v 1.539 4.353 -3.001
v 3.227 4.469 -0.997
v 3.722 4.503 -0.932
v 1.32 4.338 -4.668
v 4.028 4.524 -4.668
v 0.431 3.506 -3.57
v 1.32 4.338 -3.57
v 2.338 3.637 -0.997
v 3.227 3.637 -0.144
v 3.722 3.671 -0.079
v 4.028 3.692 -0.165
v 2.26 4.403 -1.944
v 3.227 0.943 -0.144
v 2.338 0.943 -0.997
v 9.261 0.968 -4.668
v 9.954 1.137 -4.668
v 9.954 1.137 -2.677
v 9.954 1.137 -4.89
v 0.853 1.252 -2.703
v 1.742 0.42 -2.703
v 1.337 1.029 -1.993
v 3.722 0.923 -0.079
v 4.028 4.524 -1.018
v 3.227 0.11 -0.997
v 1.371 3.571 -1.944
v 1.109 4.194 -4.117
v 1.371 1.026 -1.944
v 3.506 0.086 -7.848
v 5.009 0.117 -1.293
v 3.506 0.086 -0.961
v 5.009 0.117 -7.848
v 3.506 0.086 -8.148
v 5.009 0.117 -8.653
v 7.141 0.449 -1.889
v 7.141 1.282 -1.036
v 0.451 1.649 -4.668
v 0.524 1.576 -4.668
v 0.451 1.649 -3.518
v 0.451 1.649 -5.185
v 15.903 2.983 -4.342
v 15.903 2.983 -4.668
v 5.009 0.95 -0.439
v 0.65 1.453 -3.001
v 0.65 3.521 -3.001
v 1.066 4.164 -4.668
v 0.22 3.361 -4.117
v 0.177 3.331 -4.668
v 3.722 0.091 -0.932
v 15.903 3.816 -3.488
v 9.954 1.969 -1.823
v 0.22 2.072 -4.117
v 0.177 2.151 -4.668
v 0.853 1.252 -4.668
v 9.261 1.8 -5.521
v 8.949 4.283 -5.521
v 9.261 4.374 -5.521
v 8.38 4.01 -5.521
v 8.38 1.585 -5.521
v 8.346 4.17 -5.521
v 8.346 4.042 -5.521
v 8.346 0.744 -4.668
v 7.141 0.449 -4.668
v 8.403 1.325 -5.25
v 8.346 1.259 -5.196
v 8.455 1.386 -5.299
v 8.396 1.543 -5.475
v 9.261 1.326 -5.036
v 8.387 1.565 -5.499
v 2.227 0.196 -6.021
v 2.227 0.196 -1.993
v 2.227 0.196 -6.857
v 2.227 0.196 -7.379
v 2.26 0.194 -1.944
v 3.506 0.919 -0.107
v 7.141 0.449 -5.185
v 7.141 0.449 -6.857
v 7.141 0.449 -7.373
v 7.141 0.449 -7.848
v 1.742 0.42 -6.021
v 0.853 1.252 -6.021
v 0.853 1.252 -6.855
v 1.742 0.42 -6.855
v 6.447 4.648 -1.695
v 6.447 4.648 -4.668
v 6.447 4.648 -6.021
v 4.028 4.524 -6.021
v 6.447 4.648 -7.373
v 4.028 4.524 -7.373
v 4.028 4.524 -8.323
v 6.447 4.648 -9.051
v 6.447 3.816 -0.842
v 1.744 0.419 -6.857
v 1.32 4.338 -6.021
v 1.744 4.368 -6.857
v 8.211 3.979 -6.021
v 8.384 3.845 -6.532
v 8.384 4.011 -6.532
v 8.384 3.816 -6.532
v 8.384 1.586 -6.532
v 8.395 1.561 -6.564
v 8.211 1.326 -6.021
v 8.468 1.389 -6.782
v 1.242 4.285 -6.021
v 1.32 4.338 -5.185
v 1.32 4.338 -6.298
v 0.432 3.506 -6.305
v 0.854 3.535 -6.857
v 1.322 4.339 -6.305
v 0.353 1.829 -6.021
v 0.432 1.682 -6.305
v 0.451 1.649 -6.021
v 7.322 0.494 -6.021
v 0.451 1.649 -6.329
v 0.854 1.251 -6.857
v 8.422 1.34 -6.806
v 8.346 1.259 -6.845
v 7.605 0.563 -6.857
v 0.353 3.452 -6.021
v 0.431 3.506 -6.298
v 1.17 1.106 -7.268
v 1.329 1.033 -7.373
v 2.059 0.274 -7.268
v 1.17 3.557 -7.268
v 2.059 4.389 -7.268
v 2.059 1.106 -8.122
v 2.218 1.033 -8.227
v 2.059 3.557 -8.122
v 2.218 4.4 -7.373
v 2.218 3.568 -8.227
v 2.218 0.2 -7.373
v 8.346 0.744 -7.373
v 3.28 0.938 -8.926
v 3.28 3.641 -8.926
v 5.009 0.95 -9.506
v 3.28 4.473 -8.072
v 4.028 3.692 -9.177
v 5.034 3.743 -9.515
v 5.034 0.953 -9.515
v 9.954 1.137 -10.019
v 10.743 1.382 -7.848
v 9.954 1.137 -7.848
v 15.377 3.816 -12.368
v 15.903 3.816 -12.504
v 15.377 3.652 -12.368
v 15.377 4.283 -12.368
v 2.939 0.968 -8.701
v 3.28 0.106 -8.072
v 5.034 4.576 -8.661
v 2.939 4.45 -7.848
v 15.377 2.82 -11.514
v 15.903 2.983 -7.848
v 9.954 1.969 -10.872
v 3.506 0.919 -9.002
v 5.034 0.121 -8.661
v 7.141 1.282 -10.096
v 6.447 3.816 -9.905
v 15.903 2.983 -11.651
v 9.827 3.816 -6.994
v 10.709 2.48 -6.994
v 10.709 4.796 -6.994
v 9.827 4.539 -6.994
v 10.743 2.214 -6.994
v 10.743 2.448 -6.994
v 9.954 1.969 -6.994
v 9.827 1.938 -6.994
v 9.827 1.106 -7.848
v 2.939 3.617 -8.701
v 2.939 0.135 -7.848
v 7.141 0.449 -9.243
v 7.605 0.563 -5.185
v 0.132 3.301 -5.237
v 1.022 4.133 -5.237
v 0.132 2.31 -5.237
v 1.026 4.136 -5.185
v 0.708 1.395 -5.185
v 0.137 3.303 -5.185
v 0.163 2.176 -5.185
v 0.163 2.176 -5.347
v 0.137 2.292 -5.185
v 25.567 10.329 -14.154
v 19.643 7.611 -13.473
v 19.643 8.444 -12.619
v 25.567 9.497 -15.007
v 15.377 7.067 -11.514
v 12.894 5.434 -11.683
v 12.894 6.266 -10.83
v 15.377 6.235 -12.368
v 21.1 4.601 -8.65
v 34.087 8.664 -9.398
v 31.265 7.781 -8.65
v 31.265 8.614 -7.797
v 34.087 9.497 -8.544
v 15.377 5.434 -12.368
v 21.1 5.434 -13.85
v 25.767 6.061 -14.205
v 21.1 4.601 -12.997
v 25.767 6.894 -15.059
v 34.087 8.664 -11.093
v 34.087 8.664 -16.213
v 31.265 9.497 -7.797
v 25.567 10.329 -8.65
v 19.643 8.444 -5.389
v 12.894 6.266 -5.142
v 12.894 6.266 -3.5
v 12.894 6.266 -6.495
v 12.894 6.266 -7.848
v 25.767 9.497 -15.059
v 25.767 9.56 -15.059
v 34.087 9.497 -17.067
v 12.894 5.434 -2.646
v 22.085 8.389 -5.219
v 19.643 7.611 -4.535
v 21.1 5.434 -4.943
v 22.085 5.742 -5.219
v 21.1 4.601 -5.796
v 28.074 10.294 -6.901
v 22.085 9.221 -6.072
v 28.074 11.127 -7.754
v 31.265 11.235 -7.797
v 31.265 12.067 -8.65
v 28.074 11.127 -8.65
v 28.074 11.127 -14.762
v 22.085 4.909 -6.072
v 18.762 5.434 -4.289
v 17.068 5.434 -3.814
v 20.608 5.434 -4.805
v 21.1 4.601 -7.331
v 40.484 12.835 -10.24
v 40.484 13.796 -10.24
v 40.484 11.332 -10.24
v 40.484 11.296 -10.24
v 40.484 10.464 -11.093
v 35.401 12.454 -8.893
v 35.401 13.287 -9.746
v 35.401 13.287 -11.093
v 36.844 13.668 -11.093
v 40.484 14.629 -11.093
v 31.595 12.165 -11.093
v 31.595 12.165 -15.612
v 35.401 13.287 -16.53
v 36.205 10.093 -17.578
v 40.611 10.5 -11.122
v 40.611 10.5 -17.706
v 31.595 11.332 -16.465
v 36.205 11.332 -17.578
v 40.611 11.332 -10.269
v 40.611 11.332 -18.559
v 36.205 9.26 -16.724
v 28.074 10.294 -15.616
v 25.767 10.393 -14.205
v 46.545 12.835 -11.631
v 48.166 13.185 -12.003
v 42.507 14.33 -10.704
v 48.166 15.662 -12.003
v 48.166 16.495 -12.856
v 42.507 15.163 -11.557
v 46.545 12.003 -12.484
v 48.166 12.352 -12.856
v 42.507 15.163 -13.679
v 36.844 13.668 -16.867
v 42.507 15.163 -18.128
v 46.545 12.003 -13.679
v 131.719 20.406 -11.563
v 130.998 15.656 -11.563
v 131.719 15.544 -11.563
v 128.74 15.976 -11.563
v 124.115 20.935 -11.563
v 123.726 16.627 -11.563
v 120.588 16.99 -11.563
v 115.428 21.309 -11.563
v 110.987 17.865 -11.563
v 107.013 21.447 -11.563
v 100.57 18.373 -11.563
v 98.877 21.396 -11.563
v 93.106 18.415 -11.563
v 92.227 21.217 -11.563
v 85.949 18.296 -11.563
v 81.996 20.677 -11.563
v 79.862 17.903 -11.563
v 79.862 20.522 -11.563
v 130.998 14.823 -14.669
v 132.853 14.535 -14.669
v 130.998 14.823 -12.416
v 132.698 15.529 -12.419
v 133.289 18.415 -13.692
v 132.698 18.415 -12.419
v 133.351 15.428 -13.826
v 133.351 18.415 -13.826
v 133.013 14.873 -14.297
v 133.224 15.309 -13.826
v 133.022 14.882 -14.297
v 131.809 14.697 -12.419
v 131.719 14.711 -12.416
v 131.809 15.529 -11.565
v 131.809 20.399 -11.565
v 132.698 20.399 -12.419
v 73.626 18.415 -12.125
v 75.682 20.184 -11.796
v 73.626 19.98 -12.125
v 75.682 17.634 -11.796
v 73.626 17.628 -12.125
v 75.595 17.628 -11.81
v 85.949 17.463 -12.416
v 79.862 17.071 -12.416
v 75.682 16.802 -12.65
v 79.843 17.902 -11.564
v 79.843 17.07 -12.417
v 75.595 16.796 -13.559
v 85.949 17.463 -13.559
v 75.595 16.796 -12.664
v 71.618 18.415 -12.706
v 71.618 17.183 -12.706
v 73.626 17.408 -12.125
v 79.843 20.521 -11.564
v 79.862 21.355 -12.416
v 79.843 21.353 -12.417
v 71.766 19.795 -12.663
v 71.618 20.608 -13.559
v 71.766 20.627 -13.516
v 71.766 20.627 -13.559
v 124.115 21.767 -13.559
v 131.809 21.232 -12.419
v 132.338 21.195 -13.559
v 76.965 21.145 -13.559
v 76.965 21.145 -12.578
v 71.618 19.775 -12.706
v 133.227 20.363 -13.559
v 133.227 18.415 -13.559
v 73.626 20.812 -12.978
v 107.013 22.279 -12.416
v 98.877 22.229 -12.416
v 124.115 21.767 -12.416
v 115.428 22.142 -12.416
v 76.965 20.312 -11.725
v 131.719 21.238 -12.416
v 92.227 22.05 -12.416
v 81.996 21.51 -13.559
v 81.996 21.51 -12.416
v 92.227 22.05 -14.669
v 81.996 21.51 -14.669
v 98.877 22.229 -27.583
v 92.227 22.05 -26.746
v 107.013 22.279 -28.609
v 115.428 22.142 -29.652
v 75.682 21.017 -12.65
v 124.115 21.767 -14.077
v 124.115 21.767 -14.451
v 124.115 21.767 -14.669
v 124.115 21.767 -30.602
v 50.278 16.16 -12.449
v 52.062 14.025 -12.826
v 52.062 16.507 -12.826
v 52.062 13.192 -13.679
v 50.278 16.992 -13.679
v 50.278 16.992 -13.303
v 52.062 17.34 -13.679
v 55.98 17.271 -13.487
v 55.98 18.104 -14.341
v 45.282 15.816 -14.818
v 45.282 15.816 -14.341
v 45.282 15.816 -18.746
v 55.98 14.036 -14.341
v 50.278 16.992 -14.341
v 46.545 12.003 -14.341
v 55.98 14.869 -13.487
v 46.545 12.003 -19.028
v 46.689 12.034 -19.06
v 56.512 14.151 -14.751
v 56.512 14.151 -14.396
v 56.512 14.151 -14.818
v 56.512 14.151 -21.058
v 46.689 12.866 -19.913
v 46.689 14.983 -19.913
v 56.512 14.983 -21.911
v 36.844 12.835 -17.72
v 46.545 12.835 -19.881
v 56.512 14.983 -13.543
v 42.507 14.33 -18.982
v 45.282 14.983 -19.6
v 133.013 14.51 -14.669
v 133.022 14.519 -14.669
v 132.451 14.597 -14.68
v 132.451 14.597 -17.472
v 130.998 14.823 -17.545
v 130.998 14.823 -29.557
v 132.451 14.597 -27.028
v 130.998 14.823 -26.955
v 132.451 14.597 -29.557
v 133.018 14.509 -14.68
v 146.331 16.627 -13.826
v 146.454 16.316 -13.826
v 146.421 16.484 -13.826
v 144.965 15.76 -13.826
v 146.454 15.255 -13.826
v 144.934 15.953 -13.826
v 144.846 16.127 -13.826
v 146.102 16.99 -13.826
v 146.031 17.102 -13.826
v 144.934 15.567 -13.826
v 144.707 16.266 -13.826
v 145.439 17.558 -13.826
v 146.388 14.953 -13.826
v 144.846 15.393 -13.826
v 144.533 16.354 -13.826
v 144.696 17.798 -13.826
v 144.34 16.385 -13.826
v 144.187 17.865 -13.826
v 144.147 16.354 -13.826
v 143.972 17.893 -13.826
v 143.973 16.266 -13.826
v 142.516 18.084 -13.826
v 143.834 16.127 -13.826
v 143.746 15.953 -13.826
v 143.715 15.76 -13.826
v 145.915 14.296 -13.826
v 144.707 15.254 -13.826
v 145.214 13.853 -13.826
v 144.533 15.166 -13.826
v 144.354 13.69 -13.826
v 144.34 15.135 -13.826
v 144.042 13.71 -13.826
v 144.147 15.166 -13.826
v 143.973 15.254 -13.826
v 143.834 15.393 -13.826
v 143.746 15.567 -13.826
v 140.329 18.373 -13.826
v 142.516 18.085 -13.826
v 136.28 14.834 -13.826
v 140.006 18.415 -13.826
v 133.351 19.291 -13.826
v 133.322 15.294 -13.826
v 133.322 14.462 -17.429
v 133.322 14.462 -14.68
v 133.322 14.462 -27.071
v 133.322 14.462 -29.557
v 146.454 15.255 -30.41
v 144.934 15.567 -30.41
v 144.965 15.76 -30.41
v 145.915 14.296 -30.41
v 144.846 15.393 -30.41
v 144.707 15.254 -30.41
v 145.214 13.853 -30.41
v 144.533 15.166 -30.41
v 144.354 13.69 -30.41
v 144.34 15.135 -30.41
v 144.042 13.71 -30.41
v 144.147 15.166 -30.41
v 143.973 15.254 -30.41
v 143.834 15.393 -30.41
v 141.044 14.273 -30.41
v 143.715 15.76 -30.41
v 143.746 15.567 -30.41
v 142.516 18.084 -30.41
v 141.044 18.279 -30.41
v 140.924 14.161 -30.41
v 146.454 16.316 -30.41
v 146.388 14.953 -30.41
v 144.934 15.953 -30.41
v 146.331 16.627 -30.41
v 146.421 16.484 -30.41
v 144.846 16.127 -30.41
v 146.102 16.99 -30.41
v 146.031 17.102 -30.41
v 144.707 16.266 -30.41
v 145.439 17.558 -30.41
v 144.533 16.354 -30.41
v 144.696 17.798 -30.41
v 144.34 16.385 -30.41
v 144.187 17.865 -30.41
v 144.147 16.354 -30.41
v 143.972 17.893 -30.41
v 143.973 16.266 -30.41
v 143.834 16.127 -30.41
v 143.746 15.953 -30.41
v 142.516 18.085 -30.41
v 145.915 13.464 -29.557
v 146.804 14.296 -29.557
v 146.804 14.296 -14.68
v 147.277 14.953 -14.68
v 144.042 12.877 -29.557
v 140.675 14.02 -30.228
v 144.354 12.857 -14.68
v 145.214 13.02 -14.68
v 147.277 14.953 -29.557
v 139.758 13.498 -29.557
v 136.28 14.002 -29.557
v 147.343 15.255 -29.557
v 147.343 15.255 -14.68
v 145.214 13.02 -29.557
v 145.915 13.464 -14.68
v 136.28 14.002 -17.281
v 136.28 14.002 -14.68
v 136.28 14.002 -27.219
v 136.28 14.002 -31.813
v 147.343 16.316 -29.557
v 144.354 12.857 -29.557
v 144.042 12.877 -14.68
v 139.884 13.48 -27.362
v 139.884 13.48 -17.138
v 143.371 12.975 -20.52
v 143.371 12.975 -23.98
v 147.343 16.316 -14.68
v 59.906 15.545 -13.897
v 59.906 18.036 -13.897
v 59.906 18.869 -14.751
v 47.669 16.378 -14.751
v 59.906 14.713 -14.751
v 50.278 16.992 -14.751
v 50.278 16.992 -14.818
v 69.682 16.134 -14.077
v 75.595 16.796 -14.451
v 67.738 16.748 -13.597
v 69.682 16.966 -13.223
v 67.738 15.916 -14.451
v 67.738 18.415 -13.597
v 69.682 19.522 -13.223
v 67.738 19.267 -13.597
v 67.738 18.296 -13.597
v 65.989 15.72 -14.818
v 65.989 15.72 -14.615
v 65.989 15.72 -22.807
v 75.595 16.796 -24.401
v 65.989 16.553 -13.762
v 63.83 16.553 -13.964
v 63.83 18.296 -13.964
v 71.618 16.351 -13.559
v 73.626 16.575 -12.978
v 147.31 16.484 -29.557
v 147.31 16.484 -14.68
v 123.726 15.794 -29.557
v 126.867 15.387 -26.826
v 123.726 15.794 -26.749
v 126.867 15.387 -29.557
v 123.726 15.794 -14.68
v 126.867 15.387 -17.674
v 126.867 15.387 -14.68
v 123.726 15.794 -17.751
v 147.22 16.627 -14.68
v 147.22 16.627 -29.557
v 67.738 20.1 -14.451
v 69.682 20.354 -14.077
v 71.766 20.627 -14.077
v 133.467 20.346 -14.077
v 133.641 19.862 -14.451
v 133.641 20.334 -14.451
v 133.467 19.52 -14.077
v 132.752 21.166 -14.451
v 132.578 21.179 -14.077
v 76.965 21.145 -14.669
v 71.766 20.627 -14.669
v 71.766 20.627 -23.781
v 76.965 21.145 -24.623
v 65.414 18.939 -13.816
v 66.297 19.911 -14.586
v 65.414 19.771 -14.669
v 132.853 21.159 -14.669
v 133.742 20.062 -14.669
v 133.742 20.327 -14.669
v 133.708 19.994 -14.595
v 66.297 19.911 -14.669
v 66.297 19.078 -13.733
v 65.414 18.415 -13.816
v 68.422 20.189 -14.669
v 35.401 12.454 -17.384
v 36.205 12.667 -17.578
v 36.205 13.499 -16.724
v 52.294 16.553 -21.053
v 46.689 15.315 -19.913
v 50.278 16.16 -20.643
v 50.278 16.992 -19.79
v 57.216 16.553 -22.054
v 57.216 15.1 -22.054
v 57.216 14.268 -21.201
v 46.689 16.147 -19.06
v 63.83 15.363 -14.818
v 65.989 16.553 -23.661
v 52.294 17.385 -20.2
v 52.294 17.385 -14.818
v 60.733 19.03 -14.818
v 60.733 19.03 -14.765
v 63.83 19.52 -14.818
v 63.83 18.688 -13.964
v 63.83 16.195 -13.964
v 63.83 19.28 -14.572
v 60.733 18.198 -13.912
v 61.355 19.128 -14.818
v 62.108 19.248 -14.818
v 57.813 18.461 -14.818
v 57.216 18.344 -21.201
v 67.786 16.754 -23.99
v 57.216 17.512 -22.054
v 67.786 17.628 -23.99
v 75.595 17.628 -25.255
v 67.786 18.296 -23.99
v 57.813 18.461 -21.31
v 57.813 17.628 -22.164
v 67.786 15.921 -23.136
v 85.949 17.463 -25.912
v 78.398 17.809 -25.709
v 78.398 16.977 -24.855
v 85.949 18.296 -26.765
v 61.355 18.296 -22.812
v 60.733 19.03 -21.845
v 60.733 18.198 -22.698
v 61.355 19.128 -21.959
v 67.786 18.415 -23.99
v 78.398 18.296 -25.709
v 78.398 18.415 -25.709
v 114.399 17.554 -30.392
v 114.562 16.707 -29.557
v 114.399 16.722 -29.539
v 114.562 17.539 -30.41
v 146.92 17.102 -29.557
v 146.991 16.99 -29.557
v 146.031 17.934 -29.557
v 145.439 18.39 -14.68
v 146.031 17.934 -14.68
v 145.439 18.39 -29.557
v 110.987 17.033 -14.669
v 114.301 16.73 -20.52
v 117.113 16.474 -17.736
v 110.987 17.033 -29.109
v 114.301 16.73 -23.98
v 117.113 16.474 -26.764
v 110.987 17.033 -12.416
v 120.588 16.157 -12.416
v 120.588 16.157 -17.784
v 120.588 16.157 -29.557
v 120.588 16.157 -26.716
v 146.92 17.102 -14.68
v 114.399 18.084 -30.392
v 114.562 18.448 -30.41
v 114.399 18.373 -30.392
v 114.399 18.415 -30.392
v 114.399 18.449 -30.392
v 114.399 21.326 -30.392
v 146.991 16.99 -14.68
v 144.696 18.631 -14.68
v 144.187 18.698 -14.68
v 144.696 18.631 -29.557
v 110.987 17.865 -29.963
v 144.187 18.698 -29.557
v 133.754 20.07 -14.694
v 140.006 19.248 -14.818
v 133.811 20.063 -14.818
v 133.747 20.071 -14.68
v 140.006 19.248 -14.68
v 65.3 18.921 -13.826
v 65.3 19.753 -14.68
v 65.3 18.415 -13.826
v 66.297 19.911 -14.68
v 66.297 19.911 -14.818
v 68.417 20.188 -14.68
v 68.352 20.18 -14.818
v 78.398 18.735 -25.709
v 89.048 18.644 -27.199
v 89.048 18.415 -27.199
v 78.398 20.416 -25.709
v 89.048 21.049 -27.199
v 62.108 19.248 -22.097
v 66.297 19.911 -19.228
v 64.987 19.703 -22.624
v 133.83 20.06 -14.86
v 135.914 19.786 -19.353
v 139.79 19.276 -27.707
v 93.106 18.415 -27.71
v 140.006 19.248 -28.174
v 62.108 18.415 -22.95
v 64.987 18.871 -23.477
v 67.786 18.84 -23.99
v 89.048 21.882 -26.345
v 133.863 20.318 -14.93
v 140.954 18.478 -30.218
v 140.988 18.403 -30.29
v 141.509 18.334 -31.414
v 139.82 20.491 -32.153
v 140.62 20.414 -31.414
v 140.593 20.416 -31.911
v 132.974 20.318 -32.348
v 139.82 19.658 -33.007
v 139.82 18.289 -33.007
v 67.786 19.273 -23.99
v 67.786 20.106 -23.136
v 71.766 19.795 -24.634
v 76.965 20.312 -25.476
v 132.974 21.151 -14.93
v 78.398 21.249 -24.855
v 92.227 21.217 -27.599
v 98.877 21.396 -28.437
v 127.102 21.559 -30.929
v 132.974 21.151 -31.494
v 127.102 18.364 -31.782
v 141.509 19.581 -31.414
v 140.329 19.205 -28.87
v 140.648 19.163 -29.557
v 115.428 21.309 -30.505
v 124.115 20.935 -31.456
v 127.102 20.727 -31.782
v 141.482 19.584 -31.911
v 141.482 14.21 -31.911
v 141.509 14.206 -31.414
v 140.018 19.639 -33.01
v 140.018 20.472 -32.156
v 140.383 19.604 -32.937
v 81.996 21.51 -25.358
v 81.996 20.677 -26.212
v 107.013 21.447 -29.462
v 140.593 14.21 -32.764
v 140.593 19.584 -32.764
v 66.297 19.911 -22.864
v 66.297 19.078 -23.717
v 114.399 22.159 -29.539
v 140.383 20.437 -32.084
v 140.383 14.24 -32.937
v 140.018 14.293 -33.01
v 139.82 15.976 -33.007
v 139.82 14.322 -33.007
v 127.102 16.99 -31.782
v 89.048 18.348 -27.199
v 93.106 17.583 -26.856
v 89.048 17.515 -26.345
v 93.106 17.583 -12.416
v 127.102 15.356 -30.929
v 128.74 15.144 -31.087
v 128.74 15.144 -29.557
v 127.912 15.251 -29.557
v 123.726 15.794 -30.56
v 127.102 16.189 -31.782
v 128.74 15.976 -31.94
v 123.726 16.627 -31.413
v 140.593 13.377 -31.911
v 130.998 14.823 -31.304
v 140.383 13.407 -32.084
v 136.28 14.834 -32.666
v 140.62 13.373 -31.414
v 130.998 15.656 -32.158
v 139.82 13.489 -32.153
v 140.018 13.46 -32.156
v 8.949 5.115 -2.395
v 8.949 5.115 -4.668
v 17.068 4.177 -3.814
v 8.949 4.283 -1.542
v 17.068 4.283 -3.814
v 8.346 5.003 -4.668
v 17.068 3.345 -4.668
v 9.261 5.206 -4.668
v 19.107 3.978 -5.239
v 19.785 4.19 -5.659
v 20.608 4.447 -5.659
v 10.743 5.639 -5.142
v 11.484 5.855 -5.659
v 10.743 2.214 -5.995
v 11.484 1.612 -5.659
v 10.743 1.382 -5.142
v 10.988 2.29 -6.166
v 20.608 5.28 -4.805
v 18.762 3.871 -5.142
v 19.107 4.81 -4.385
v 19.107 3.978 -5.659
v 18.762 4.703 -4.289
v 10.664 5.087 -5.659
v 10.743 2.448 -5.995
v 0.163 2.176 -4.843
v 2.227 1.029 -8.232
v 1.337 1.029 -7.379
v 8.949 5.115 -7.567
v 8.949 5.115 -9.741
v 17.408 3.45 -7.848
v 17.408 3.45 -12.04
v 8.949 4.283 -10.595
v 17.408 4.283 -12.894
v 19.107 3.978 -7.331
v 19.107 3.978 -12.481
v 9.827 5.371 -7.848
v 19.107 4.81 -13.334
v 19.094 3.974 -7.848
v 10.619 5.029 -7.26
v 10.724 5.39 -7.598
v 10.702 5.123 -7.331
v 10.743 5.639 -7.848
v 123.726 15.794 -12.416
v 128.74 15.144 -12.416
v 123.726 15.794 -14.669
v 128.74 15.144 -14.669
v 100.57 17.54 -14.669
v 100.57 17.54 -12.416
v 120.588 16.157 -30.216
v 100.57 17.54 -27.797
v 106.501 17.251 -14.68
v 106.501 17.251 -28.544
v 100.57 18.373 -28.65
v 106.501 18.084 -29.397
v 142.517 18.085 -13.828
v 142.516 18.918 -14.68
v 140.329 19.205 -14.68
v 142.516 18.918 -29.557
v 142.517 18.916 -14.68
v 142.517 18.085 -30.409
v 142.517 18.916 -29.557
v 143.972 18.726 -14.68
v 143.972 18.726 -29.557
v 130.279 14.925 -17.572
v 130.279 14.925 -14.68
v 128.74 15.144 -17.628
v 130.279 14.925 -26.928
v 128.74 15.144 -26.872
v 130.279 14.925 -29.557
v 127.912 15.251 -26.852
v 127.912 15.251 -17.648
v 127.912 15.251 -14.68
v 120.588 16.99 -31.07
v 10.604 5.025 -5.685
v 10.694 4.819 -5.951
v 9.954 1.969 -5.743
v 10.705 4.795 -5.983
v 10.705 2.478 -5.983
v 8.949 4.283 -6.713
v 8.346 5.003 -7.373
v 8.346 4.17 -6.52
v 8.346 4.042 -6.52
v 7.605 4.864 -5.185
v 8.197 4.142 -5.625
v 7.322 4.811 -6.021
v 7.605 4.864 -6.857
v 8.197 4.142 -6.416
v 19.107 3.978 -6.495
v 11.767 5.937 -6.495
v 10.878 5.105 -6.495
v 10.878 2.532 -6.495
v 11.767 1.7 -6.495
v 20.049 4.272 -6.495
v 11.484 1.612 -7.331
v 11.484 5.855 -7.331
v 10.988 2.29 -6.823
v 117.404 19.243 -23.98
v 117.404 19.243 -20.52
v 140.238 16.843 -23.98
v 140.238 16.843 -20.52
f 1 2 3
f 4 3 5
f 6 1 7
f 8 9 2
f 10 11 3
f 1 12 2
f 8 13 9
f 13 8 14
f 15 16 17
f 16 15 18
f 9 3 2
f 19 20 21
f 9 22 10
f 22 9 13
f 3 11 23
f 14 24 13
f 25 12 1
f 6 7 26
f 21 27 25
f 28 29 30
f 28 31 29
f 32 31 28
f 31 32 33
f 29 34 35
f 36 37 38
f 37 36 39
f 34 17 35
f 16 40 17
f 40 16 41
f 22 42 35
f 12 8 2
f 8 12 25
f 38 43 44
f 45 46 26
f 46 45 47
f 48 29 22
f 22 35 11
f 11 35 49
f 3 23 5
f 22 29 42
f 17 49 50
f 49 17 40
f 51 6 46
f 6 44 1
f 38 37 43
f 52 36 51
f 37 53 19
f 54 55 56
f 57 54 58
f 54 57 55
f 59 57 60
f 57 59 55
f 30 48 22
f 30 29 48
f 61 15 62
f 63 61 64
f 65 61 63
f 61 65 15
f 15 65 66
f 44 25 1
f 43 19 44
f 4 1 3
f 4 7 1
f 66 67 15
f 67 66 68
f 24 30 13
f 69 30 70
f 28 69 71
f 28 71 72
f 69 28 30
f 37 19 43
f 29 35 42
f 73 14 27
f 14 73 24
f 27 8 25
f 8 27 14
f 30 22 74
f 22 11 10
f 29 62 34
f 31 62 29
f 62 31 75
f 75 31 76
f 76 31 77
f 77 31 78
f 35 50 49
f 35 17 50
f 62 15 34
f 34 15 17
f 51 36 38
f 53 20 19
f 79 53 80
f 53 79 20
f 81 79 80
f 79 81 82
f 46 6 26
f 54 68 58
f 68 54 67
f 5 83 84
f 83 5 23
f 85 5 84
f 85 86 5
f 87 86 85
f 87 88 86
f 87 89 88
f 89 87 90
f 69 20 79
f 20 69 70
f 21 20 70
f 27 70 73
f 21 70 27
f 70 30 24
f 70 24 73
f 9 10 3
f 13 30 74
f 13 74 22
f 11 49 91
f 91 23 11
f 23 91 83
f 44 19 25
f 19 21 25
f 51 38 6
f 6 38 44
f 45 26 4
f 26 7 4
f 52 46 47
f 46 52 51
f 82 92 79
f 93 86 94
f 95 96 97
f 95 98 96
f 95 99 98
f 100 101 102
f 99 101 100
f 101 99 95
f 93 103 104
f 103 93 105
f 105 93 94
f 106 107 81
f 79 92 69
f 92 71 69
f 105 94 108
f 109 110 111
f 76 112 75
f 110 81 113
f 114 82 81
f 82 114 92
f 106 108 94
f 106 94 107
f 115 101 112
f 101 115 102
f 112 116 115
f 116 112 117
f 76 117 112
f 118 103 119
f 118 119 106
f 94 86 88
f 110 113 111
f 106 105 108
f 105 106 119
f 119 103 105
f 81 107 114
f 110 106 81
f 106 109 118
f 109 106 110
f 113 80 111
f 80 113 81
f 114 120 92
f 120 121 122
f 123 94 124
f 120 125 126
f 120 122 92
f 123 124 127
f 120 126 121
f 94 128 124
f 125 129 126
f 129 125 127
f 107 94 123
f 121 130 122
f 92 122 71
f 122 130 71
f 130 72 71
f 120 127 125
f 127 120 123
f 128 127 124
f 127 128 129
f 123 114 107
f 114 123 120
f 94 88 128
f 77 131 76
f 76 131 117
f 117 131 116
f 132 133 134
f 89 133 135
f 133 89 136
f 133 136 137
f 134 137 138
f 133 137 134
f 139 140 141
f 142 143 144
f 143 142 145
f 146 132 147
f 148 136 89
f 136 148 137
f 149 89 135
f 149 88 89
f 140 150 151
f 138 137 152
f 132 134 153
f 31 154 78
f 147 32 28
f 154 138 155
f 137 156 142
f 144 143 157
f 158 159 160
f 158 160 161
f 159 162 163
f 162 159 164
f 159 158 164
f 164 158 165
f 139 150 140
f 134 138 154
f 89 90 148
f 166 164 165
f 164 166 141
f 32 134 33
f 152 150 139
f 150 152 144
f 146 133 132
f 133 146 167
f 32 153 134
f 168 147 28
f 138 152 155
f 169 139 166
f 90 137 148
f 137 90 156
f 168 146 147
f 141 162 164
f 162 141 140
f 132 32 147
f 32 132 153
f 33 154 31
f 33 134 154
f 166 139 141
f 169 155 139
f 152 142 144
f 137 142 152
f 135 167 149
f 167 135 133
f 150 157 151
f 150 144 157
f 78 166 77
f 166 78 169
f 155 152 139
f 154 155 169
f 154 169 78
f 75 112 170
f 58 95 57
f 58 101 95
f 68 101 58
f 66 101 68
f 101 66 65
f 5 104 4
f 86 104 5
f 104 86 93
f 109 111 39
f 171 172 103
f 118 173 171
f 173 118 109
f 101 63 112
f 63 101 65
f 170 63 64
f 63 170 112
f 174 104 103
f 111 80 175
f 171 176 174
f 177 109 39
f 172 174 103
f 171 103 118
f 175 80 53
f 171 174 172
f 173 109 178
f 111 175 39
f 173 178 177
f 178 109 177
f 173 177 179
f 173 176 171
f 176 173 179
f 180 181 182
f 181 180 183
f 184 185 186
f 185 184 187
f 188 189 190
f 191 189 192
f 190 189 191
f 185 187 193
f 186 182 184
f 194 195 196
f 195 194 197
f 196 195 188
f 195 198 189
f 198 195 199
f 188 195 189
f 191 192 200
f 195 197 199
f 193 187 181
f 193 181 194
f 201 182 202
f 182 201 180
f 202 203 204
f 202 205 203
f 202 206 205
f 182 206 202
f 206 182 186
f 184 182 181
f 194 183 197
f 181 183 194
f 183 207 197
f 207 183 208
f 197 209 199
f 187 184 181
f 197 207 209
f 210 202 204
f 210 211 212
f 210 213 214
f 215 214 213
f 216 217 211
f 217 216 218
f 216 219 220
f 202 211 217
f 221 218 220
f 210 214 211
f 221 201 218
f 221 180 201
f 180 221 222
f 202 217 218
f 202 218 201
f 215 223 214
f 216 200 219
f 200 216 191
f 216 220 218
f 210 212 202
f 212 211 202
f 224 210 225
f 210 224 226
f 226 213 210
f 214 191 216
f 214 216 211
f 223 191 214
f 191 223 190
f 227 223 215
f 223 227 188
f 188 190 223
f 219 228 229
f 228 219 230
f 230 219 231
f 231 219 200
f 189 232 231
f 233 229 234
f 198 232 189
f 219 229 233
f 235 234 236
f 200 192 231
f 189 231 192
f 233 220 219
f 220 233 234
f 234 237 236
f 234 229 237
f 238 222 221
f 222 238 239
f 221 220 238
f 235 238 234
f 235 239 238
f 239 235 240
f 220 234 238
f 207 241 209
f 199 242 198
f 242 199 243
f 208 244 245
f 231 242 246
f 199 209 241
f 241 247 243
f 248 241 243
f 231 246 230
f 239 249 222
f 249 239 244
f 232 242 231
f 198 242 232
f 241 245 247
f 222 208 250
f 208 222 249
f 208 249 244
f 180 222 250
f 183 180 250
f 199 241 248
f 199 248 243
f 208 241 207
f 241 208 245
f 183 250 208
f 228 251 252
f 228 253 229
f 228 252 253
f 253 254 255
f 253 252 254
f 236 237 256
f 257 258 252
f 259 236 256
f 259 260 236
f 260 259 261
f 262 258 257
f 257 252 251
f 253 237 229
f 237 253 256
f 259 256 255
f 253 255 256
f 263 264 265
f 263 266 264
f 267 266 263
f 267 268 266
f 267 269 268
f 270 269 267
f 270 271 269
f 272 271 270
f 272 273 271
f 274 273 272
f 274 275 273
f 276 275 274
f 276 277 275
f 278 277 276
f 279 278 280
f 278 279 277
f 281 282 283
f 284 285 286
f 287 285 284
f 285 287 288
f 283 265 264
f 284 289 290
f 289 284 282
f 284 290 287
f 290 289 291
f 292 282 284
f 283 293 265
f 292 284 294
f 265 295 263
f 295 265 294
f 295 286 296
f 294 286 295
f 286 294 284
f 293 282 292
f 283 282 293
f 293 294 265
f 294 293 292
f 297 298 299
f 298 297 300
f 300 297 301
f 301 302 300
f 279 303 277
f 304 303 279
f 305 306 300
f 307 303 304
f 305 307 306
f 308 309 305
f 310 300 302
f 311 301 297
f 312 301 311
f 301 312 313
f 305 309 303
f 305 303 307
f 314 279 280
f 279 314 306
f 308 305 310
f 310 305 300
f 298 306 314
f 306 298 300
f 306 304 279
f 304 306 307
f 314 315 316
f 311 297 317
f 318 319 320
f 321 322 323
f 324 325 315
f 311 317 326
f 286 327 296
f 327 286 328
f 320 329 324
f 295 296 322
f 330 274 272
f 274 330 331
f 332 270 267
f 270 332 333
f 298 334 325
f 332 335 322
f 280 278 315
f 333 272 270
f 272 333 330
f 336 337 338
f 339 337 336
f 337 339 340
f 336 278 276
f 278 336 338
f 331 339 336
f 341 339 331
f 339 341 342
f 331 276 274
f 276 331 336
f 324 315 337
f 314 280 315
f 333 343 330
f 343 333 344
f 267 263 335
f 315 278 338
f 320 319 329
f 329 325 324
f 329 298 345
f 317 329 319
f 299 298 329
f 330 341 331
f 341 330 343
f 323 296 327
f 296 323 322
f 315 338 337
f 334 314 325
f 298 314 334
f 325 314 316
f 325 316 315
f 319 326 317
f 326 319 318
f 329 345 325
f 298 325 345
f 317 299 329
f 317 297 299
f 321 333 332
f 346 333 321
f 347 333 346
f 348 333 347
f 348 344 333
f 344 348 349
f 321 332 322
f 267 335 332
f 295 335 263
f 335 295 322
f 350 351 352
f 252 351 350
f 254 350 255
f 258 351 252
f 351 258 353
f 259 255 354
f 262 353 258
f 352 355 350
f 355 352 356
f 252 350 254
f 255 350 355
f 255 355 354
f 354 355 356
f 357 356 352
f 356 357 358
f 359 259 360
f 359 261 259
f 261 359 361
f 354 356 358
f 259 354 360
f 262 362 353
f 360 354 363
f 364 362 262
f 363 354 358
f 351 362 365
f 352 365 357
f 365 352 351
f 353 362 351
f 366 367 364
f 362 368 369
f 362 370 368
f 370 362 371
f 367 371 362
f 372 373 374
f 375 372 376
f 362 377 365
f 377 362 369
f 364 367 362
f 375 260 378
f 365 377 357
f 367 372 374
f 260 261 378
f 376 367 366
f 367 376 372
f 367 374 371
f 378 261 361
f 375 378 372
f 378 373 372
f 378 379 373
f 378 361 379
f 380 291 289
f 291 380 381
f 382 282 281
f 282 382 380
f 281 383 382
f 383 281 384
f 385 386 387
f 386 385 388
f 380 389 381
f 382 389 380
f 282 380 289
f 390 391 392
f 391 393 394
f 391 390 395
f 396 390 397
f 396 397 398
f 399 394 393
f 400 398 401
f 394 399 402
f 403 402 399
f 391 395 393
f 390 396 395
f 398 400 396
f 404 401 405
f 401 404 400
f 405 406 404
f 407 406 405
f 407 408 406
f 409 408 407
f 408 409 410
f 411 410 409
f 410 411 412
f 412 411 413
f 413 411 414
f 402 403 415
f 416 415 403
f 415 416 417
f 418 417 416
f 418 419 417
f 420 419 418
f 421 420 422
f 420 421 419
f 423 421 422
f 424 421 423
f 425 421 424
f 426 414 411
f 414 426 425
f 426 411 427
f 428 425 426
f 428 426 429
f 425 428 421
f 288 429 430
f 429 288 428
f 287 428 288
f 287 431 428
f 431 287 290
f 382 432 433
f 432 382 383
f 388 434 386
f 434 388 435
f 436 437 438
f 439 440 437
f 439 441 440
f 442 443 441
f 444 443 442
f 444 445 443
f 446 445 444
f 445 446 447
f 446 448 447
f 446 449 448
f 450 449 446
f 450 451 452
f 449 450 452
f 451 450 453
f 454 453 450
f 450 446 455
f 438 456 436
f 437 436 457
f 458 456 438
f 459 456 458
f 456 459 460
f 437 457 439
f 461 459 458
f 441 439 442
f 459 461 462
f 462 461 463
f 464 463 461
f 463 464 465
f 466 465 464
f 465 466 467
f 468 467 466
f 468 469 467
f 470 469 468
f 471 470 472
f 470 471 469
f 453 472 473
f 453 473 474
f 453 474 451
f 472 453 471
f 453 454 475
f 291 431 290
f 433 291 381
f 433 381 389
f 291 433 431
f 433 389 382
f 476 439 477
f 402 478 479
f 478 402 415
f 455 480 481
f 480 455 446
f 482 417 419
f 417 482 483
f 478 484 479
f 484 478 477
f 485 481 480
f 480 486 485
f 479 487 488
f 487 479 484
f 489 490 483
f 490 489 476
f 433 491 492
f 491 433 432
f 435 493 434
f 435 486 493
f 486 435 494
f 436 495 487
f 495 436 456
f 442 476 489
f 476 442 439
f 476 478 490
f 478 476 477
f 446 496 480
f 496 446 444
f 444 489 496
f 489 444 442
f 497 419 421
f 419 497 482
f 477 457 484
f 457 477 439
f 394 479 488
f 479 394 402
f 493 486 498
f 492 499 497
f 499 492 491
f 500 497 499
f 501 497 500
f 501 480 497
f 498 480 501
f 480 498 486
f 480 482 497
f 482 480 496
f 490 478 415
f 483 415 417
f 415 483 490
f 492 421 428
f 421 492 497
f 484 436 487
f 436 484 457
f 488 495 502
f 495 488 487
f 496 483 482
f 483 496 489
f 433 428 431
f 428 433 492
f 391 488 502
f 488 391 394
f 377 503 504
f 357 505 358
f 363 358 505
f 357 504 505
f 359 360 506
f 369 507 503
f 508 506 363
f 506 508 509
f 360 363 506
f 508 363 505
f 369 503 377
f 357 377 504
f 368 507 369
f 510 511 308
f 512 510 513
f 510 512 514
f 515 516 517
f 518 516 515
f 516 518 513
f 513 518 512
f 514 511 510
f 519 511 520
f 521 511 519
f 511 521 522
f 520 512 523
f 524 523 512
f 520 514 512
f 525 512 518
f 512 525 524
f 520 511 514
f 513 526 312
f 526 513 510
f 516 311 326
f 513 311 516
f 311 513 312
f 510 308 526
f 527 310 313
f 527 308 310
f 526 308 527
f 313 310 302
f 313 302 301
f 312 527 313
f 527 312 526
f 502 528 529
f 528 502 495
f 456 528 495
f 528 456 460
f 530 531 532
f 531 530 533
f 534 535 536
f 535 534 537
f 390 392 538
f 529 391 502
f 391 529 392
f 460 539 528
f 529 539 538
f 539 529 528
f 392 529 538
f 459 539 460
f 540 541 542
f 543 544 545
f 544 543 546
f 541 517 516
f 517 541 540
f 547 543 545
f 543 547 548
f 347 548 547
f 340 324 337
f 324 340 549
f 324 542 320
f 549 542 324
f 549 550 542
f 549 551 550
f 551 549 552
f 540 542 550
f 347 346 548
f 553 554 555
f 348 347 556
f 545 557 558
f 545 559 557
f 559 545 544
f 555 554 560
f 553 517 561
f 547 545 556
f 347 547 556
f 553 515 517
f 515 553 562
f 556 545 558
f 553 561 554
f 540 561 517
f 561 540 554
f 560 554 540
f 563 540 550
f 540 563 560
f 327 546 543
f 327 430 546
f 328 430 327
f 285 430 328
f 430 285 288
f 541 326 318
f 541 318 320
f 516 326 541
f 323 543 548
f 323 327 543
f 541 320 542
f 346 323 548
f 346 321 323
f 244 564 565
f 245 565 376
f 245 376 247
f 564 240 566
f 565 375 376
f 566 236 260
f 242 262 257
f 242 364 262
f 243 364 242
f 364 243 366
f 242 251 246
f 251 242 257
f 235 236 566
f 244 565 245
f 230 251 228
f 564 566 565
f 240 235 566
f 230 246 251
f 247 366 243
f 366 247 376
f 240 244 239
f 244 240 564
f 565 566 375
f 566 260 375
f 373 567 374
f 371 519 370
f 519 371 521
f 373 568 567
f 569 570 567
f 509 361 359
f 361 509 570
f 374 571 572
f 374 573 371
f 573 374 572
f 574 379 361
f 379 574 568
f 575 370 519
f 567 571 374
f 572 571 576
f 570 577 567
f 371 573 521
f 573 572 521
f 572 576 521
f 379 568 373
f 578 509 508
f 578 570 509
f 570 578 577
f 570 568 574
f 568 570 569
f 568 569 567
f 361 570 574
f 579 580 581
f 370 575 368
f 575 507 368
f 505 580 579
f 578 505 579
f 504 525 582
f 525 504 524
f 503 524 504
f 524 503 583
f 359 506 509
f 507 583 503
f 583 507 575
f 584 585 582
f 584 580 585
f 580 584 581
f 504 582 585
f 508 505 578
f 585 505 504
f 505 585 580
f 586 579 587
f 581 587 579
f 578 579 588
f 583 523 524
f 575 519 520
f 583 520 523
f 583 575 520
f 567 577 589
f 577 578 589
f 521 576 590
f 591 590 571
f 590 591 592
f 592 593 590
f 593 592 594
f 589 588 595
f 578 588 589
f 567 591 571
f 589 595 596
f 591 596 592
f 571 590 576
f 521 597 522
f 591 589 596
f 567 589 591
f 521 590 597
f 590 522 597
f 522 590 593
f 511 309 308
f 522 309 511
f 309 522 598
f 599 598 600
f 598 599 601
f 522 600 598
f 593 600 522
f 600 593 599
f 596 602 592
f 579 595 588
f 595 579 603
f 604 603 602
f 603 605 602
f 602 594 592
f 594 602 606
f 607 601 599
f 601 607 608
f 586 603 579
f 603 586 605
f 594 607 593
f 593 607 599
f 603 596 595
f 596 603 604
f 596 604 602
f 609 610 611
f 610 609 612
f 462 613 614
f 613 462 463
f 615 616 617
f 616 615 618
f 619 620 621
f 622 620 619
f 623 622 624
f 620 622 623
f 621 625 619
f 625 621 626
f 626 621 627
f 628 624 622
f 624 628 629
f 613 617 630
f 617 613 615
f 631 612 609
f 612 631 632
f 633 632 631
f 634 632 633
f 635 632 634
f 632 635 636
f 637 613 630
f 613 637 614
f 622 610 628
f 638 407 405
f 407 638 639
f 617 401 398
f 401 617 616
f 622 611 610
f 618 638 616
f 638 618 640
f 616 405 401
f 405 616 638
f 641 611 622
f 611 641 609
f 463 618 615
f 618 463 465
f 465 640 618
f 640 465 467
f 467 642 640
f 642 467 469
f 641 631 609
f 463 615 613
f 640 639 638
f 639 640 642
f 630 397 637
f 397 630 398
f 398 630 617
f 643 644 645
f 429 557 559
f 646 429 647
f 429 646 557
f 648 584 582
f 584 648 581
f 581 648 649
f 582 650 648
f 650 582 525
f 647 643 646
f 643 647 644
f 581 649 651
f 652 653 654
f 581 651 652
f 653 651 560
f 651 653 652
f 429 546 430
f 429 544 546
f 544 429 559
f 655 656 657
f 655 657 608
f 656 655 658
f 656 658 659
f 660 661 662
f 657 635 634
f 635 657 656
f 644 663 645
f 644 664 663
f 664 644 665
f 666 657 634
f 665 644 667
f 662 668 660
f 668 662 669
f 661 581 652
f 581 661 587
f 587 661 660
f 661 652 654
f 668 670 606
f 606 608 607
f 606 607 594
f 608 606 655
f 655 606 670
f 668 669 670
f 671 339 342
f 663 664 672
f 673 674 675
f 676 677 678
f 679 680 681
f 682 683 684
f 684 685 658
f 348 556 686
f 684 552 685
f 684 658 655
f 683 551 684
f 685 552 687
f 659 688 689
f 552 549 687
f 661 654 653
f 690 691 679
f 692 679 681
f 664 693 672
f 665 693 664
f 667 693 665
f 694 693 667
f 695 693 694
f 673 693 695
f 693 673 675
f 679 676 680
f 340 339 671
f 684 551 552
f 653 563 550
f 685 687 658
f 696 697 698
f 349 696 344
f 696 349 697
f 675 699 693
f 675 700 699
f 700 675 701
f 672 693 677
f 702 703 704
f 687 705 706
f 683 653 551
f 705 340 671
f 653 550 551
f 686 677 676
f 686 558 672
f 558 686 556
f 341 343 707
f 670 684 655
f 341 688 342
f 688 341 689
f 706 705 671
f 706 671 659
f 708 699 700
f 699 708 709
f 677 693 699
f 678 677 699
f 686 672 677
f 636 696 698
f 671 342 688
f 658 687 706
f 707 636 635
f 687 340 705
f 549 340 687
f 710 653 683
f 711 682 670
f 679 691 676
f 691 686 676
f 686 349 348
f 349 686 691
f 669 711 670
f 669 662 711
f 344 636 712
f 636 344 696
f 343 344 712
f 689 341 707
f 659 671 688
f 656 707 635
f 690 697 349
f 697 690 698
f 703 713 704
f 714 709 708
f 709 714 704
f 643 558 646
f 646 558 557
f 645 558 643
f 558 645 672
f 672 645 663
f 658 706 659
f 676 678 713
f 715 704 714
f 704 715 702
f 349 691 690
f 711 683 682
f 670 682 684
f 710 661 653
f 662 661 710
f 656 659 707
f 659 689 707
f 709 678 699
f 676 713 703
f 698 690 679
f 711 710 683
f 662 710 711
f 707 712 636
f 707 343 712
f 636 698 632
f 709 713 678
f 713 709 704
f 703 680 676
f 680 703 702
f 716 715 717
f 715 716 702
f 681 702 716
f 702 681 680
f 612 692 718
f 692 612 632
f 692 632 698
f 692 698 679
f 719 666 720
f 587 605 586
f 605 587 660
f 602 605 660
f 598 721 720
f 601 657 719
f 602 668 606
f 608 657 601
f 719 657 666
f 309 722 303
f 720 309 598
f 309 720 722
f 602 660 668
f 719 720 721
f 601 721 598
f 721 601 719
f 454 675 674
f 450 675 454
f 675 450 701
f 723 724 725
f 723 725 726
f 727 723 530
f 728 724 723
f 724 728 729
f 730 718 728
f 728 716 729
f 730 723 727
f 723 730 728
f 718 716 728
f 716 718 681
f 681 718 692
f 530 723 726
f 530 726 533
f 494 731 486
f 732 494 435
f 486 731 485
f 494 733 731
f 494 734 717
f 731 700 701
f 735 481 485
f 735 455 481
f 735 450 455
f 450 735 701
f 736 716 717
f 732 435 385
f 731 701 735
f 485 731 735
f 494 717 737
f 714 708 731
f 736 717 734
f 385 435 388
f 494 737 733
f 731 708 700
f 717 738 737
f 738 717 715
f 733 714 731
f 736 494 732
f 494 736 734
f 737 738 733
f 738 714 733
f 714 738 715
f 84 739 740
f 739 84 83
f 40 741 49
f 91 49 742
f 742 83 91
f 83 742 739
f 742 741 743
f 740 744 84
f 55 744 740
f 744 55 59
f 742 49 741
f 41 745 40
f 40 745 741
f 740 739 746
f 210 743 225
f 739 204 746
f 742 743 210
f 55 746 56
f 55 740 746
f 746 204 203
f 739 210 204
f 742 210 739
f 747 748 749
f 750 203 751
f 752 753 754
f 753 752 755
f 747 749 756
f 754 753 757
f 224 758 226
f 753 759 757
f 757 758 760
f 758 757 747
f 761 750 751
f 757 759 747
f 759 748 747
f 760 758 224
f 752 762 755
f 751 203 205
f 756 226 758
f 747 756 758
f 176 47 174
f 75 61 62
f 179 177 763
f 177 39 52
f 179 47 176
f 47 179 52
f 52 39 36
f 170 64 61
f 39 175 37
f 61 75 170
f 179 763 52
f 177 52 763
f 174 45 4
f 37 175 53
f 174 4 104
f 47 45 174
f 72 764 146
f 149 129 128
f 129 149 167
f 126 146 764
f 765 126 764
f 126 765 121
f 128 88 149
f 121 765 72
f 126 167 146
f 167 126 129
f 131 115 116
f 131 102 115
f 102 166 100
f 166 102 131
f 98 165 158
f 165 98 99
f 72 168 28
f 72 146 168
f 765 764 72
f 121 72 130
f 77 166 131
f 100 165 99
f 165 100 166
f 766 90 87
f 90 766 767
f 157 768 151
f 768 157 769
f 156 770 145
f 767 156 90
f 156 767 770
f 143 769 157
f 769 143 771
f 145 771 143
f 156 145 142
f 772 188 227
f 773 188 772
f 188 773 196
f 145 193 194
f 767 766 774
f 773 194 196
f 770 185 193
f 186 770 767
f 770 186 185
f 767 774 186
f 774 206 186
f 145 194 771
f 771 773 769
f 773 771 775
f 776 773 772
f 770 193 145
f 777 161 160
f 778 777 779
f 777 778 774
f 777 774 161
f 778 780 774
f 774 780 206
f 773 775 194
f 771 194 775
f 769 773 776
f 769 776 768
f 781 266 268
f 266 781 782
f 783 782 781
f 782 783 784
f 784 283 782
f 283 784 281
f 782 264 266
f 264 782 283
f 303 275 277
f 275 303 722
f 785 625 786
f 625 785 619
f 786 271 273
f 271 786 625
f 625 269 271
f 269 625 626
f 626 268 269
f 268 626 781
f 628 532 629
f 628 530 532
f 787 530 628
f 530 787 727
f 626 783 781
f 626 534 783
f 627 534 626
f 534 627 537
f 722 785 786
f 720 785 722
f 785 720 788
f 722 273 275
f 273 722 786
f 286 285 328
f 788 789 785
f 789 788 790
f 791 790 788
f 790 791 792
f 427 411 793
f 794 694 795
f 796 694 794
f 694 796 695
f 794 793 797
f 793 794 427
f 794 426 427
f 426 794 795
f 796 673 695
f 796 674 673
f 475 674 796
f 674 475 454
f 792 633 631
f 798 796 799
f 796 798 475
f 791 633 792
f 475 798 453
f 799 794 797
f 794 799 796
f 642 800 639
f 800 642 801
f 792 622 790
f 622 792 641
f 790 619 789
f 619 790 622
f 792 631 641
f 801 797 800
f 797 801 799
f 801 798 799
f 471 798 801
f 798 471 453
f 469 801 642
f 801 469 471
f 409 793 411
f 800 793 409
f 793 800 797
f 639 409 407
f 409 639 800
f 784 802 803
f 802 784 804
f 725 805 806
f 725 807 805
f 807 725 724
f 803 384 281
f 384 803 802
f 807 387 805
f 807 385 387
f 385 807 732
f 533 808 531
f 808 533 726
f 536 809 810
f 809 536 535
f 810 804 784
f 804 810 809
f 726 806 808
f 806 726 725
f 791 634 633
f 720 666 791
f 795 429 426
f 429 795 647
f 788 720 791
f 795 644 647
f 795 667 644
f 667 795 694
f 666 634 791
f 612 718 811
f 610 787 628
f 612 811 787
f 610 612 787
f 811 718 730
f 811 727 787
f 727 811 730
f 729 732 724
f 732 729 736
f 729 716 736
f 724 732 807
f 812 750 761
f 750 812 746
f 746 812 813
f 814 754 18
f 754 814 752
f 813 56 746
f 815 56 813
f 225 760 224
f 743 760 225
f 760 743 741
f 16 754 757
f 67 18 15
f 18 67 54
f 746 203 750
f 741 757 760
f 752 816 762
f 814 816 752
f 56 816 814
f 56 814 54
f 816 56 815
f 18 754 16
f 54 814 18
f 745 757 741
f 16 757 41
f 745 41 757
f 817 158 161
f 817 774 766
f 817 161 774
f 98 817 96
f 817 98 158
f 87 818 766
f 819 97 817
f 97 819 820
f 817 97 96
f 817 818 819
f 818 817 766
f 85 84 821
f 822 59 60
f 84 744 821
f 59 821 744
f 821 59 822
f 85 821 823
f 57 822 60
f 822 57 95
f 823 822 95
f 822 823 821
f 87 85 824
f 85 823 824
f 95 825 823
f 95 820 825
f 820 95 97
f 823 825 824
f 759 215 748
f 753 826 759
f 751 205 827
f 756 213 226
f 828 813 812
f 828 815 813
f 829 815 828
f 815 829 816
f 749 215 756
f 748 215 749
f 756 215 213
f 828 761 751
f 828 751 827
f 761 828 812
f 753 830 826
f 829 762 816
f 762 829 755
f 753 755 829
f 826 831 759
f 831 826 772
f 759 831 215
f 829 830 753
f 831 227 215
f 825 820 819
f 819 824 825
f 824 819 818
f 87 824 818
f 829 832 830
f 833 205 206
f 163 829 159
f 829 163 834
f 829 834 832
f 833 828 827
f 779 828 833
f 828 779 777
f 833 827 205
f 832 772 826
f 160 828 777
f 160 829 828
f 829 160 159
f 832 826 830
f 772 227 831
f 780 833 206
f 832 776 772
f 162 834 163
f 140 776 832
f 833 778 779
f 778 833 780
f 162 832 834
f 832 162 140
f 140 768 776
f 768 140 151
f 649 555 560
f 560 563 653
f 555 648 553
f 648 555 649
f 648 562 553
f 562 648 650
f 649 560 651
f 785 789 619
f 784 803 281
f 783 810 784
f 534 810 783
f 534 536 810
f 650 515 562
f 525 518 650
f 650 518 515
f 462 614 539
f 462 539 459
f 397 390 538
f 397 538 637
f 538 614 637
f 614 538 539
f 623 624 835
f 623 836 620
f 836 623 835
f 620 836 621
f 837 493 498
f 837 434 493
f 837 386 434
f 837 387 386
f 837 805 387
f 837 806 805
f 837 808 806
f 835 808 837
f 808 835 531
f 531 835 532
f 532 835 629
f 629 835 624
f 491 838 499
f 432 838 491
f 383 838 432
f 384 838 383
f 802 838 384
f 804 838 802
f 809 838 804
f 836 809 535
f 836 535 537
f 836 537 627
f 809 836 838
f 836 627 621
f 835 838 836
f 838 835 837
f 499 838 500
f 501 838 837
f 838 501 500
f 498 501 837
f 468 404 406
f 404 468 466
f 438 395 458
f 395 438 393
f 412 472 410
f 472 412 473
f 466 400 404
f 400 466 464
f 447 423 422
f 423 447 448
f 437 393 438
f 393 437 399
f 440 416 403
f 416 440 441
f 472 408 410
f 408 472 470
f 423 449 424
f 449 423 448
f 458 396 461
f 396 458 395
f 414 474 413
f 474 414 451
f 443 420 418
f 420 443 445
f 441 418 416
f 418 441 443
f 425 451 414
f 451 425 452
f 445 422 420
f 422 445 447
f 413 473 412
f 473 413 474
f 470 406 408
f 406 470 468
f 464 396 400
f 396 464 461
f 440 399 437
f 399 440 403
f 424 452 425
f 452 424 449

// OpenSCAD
// file: ../chamferer.scad
INFINITY = 10000;
ATOM = .01;

module chamfer_tool(r, fn, tool) {
    if (tool=="sphere") {
        sphere(r, $fn=fn);
    }
    else if (tool=="cone") {
        cylinder(r, r, 0, $fn=fn);
        scale([1, 1, -1])
        cylinder(r, r, 0, $fn=fn);
    }
    else if (tool=="octahedron") {
        resize([r*2, r*2, r*2]) {
            cylinder(r, r, 0, $fn=4);
            scale([1, 1, -1])
            cylinder(r, r, 0, $fn=4);
        }
    }
    else if (tool=="pyramid") {
        resize([r*2, r*2, r*2]) {
            cylinder(r, r, 0, center=true, $fn=4);
        }
    }
    else if (tool=="rpyramid") {
        resize([r*2, r*2, r*2]) {
            cylinder(r, 0, r, center=true, $fn=4);
        }
    }
    else if (tool=="cylinder") {
        cylinder(r=r, h=ATOM, $fn=fn);
    }
}

module shrinker(r, tool="sphere", fn=8) {
    if (!r) {
        children();
    }
    else {
        // re-invert+grow = fillet
        difference() {
            cube(INFINITY/2, center=true);

            // invert+grow = carve
            minkowski() {
                difference() {
                    cube(INFINITY, center=true);
                    children();
                }
                //cube(r, center=true);
                chamfer_tool(r, fn=fn, tool=tool);
            }
        }
    }
}

module chamferer(r, tool="sphere", fn=8, shrink=true, grow=true) {
    if (!r) {
        children();
    }
    else {
        minkowski() {
            if (shrink)
                shrinker(r, tool, fn) children();
            else
                children();
            
            if (grow)
                chamfer_tool(r, fn=fn, tool=tool);
        }
    }
}



cube(50);

translate([70, 0, 0])
chamferer(5, "sphere", $preview? 6*4 : 30)
//shrinker(5, "sphere", $preview? 6*4 : 30)
cube(50);

translate([70*2, 0, 0])
chamferer(5, "octahedron", grow=false)
cube(50);
// main file
use <../chamferer.scad>

LENGTH         = 147.4;
WIDTH          =  22.2;
HEIGHT         =  33.0;
CHAMFER        =   0.9;
SCREW_DIAMETER = 1.25;

module raw_branch_0() {
    intersection() {
       translate([0, 30, 0])
       rotate([90, 0, 0])
        linear_extrude(50)
        translate([0, -264, 0])
        import("img/branch-side-view.dxf");

        linear_extrude(100)
        translate([0, -274.8, 0])
        import("img/branch-top-view.dxf");
    }
}

module raw_branch_1() {
    difference() {
        raw_branch_0();
        
        // hole for strap
        hull() {
            translate([8, 0, 5.4]) {
                rotate([-90, 0, 0]) cylinder(d=3, h=60, $fn=10, center=true);

                translate([1.5, 0, .5])
                rotate([-90, 0, 0]) cylinder(d=3, h=60, $fn=10, center=true);
            }
        }
    }
}

module raw_branch_2() {
    intersection() {
        raw_branch_1();

        // keep but diagonal cut
        union() {
            translate([0, 34.18, 14.52 + 15.7/2])
            rotate([0, 0, -8])
            cube([LENGTH*3, 9, 15.7], center=true);

            translate([-34.25, 0, 0])
            rotate([0, 24, 0])
            cube([LENGTH*2, LENGTH, LENGTH*3], center=true);
        }
    }

}

module chamfer() {
    if (0 && $preview) children();
    else {
        KX = LENGTH / (LENGTH + CHAMFER*2);
        KY = WIDTH / (WIDTH + CHAMFER*2);
        KZ = HEIGHT / (HEIGHT + CHAMFER*2);
        translate([CHAMFER, CHAMFER, CHAMFER]) scale([KX, KY, KZ]) chamferer(CHAMFER, "octahedron", shrink=false, grow=true)
        children();
    }
}

module branch() {
    difference() {
        chamfer()
        raw_branch_2();

        // hollowing
        translate([139 - 4, -.4 +.7, 19.5])
        rotate([0, 0, -8+2])
        {
            l = 30;
            translate([-l+7, 0, -2.5])
            chamferer(3.52, "octahedron", shrink=true, grow=true)
            cube([l, 17, 10.5]);
        }

        // screw hole
        translate([145.2 -.86, 16.1-.04 -.3, 0])
        cylinder(d=SCREW_DIAMETER, h=HEIGHT, $fn=20);
    }
}

//%cube([LENGTH, WIDTH, HEIGHT]);
//branch()

scale([1, 1, -1])
branch();
